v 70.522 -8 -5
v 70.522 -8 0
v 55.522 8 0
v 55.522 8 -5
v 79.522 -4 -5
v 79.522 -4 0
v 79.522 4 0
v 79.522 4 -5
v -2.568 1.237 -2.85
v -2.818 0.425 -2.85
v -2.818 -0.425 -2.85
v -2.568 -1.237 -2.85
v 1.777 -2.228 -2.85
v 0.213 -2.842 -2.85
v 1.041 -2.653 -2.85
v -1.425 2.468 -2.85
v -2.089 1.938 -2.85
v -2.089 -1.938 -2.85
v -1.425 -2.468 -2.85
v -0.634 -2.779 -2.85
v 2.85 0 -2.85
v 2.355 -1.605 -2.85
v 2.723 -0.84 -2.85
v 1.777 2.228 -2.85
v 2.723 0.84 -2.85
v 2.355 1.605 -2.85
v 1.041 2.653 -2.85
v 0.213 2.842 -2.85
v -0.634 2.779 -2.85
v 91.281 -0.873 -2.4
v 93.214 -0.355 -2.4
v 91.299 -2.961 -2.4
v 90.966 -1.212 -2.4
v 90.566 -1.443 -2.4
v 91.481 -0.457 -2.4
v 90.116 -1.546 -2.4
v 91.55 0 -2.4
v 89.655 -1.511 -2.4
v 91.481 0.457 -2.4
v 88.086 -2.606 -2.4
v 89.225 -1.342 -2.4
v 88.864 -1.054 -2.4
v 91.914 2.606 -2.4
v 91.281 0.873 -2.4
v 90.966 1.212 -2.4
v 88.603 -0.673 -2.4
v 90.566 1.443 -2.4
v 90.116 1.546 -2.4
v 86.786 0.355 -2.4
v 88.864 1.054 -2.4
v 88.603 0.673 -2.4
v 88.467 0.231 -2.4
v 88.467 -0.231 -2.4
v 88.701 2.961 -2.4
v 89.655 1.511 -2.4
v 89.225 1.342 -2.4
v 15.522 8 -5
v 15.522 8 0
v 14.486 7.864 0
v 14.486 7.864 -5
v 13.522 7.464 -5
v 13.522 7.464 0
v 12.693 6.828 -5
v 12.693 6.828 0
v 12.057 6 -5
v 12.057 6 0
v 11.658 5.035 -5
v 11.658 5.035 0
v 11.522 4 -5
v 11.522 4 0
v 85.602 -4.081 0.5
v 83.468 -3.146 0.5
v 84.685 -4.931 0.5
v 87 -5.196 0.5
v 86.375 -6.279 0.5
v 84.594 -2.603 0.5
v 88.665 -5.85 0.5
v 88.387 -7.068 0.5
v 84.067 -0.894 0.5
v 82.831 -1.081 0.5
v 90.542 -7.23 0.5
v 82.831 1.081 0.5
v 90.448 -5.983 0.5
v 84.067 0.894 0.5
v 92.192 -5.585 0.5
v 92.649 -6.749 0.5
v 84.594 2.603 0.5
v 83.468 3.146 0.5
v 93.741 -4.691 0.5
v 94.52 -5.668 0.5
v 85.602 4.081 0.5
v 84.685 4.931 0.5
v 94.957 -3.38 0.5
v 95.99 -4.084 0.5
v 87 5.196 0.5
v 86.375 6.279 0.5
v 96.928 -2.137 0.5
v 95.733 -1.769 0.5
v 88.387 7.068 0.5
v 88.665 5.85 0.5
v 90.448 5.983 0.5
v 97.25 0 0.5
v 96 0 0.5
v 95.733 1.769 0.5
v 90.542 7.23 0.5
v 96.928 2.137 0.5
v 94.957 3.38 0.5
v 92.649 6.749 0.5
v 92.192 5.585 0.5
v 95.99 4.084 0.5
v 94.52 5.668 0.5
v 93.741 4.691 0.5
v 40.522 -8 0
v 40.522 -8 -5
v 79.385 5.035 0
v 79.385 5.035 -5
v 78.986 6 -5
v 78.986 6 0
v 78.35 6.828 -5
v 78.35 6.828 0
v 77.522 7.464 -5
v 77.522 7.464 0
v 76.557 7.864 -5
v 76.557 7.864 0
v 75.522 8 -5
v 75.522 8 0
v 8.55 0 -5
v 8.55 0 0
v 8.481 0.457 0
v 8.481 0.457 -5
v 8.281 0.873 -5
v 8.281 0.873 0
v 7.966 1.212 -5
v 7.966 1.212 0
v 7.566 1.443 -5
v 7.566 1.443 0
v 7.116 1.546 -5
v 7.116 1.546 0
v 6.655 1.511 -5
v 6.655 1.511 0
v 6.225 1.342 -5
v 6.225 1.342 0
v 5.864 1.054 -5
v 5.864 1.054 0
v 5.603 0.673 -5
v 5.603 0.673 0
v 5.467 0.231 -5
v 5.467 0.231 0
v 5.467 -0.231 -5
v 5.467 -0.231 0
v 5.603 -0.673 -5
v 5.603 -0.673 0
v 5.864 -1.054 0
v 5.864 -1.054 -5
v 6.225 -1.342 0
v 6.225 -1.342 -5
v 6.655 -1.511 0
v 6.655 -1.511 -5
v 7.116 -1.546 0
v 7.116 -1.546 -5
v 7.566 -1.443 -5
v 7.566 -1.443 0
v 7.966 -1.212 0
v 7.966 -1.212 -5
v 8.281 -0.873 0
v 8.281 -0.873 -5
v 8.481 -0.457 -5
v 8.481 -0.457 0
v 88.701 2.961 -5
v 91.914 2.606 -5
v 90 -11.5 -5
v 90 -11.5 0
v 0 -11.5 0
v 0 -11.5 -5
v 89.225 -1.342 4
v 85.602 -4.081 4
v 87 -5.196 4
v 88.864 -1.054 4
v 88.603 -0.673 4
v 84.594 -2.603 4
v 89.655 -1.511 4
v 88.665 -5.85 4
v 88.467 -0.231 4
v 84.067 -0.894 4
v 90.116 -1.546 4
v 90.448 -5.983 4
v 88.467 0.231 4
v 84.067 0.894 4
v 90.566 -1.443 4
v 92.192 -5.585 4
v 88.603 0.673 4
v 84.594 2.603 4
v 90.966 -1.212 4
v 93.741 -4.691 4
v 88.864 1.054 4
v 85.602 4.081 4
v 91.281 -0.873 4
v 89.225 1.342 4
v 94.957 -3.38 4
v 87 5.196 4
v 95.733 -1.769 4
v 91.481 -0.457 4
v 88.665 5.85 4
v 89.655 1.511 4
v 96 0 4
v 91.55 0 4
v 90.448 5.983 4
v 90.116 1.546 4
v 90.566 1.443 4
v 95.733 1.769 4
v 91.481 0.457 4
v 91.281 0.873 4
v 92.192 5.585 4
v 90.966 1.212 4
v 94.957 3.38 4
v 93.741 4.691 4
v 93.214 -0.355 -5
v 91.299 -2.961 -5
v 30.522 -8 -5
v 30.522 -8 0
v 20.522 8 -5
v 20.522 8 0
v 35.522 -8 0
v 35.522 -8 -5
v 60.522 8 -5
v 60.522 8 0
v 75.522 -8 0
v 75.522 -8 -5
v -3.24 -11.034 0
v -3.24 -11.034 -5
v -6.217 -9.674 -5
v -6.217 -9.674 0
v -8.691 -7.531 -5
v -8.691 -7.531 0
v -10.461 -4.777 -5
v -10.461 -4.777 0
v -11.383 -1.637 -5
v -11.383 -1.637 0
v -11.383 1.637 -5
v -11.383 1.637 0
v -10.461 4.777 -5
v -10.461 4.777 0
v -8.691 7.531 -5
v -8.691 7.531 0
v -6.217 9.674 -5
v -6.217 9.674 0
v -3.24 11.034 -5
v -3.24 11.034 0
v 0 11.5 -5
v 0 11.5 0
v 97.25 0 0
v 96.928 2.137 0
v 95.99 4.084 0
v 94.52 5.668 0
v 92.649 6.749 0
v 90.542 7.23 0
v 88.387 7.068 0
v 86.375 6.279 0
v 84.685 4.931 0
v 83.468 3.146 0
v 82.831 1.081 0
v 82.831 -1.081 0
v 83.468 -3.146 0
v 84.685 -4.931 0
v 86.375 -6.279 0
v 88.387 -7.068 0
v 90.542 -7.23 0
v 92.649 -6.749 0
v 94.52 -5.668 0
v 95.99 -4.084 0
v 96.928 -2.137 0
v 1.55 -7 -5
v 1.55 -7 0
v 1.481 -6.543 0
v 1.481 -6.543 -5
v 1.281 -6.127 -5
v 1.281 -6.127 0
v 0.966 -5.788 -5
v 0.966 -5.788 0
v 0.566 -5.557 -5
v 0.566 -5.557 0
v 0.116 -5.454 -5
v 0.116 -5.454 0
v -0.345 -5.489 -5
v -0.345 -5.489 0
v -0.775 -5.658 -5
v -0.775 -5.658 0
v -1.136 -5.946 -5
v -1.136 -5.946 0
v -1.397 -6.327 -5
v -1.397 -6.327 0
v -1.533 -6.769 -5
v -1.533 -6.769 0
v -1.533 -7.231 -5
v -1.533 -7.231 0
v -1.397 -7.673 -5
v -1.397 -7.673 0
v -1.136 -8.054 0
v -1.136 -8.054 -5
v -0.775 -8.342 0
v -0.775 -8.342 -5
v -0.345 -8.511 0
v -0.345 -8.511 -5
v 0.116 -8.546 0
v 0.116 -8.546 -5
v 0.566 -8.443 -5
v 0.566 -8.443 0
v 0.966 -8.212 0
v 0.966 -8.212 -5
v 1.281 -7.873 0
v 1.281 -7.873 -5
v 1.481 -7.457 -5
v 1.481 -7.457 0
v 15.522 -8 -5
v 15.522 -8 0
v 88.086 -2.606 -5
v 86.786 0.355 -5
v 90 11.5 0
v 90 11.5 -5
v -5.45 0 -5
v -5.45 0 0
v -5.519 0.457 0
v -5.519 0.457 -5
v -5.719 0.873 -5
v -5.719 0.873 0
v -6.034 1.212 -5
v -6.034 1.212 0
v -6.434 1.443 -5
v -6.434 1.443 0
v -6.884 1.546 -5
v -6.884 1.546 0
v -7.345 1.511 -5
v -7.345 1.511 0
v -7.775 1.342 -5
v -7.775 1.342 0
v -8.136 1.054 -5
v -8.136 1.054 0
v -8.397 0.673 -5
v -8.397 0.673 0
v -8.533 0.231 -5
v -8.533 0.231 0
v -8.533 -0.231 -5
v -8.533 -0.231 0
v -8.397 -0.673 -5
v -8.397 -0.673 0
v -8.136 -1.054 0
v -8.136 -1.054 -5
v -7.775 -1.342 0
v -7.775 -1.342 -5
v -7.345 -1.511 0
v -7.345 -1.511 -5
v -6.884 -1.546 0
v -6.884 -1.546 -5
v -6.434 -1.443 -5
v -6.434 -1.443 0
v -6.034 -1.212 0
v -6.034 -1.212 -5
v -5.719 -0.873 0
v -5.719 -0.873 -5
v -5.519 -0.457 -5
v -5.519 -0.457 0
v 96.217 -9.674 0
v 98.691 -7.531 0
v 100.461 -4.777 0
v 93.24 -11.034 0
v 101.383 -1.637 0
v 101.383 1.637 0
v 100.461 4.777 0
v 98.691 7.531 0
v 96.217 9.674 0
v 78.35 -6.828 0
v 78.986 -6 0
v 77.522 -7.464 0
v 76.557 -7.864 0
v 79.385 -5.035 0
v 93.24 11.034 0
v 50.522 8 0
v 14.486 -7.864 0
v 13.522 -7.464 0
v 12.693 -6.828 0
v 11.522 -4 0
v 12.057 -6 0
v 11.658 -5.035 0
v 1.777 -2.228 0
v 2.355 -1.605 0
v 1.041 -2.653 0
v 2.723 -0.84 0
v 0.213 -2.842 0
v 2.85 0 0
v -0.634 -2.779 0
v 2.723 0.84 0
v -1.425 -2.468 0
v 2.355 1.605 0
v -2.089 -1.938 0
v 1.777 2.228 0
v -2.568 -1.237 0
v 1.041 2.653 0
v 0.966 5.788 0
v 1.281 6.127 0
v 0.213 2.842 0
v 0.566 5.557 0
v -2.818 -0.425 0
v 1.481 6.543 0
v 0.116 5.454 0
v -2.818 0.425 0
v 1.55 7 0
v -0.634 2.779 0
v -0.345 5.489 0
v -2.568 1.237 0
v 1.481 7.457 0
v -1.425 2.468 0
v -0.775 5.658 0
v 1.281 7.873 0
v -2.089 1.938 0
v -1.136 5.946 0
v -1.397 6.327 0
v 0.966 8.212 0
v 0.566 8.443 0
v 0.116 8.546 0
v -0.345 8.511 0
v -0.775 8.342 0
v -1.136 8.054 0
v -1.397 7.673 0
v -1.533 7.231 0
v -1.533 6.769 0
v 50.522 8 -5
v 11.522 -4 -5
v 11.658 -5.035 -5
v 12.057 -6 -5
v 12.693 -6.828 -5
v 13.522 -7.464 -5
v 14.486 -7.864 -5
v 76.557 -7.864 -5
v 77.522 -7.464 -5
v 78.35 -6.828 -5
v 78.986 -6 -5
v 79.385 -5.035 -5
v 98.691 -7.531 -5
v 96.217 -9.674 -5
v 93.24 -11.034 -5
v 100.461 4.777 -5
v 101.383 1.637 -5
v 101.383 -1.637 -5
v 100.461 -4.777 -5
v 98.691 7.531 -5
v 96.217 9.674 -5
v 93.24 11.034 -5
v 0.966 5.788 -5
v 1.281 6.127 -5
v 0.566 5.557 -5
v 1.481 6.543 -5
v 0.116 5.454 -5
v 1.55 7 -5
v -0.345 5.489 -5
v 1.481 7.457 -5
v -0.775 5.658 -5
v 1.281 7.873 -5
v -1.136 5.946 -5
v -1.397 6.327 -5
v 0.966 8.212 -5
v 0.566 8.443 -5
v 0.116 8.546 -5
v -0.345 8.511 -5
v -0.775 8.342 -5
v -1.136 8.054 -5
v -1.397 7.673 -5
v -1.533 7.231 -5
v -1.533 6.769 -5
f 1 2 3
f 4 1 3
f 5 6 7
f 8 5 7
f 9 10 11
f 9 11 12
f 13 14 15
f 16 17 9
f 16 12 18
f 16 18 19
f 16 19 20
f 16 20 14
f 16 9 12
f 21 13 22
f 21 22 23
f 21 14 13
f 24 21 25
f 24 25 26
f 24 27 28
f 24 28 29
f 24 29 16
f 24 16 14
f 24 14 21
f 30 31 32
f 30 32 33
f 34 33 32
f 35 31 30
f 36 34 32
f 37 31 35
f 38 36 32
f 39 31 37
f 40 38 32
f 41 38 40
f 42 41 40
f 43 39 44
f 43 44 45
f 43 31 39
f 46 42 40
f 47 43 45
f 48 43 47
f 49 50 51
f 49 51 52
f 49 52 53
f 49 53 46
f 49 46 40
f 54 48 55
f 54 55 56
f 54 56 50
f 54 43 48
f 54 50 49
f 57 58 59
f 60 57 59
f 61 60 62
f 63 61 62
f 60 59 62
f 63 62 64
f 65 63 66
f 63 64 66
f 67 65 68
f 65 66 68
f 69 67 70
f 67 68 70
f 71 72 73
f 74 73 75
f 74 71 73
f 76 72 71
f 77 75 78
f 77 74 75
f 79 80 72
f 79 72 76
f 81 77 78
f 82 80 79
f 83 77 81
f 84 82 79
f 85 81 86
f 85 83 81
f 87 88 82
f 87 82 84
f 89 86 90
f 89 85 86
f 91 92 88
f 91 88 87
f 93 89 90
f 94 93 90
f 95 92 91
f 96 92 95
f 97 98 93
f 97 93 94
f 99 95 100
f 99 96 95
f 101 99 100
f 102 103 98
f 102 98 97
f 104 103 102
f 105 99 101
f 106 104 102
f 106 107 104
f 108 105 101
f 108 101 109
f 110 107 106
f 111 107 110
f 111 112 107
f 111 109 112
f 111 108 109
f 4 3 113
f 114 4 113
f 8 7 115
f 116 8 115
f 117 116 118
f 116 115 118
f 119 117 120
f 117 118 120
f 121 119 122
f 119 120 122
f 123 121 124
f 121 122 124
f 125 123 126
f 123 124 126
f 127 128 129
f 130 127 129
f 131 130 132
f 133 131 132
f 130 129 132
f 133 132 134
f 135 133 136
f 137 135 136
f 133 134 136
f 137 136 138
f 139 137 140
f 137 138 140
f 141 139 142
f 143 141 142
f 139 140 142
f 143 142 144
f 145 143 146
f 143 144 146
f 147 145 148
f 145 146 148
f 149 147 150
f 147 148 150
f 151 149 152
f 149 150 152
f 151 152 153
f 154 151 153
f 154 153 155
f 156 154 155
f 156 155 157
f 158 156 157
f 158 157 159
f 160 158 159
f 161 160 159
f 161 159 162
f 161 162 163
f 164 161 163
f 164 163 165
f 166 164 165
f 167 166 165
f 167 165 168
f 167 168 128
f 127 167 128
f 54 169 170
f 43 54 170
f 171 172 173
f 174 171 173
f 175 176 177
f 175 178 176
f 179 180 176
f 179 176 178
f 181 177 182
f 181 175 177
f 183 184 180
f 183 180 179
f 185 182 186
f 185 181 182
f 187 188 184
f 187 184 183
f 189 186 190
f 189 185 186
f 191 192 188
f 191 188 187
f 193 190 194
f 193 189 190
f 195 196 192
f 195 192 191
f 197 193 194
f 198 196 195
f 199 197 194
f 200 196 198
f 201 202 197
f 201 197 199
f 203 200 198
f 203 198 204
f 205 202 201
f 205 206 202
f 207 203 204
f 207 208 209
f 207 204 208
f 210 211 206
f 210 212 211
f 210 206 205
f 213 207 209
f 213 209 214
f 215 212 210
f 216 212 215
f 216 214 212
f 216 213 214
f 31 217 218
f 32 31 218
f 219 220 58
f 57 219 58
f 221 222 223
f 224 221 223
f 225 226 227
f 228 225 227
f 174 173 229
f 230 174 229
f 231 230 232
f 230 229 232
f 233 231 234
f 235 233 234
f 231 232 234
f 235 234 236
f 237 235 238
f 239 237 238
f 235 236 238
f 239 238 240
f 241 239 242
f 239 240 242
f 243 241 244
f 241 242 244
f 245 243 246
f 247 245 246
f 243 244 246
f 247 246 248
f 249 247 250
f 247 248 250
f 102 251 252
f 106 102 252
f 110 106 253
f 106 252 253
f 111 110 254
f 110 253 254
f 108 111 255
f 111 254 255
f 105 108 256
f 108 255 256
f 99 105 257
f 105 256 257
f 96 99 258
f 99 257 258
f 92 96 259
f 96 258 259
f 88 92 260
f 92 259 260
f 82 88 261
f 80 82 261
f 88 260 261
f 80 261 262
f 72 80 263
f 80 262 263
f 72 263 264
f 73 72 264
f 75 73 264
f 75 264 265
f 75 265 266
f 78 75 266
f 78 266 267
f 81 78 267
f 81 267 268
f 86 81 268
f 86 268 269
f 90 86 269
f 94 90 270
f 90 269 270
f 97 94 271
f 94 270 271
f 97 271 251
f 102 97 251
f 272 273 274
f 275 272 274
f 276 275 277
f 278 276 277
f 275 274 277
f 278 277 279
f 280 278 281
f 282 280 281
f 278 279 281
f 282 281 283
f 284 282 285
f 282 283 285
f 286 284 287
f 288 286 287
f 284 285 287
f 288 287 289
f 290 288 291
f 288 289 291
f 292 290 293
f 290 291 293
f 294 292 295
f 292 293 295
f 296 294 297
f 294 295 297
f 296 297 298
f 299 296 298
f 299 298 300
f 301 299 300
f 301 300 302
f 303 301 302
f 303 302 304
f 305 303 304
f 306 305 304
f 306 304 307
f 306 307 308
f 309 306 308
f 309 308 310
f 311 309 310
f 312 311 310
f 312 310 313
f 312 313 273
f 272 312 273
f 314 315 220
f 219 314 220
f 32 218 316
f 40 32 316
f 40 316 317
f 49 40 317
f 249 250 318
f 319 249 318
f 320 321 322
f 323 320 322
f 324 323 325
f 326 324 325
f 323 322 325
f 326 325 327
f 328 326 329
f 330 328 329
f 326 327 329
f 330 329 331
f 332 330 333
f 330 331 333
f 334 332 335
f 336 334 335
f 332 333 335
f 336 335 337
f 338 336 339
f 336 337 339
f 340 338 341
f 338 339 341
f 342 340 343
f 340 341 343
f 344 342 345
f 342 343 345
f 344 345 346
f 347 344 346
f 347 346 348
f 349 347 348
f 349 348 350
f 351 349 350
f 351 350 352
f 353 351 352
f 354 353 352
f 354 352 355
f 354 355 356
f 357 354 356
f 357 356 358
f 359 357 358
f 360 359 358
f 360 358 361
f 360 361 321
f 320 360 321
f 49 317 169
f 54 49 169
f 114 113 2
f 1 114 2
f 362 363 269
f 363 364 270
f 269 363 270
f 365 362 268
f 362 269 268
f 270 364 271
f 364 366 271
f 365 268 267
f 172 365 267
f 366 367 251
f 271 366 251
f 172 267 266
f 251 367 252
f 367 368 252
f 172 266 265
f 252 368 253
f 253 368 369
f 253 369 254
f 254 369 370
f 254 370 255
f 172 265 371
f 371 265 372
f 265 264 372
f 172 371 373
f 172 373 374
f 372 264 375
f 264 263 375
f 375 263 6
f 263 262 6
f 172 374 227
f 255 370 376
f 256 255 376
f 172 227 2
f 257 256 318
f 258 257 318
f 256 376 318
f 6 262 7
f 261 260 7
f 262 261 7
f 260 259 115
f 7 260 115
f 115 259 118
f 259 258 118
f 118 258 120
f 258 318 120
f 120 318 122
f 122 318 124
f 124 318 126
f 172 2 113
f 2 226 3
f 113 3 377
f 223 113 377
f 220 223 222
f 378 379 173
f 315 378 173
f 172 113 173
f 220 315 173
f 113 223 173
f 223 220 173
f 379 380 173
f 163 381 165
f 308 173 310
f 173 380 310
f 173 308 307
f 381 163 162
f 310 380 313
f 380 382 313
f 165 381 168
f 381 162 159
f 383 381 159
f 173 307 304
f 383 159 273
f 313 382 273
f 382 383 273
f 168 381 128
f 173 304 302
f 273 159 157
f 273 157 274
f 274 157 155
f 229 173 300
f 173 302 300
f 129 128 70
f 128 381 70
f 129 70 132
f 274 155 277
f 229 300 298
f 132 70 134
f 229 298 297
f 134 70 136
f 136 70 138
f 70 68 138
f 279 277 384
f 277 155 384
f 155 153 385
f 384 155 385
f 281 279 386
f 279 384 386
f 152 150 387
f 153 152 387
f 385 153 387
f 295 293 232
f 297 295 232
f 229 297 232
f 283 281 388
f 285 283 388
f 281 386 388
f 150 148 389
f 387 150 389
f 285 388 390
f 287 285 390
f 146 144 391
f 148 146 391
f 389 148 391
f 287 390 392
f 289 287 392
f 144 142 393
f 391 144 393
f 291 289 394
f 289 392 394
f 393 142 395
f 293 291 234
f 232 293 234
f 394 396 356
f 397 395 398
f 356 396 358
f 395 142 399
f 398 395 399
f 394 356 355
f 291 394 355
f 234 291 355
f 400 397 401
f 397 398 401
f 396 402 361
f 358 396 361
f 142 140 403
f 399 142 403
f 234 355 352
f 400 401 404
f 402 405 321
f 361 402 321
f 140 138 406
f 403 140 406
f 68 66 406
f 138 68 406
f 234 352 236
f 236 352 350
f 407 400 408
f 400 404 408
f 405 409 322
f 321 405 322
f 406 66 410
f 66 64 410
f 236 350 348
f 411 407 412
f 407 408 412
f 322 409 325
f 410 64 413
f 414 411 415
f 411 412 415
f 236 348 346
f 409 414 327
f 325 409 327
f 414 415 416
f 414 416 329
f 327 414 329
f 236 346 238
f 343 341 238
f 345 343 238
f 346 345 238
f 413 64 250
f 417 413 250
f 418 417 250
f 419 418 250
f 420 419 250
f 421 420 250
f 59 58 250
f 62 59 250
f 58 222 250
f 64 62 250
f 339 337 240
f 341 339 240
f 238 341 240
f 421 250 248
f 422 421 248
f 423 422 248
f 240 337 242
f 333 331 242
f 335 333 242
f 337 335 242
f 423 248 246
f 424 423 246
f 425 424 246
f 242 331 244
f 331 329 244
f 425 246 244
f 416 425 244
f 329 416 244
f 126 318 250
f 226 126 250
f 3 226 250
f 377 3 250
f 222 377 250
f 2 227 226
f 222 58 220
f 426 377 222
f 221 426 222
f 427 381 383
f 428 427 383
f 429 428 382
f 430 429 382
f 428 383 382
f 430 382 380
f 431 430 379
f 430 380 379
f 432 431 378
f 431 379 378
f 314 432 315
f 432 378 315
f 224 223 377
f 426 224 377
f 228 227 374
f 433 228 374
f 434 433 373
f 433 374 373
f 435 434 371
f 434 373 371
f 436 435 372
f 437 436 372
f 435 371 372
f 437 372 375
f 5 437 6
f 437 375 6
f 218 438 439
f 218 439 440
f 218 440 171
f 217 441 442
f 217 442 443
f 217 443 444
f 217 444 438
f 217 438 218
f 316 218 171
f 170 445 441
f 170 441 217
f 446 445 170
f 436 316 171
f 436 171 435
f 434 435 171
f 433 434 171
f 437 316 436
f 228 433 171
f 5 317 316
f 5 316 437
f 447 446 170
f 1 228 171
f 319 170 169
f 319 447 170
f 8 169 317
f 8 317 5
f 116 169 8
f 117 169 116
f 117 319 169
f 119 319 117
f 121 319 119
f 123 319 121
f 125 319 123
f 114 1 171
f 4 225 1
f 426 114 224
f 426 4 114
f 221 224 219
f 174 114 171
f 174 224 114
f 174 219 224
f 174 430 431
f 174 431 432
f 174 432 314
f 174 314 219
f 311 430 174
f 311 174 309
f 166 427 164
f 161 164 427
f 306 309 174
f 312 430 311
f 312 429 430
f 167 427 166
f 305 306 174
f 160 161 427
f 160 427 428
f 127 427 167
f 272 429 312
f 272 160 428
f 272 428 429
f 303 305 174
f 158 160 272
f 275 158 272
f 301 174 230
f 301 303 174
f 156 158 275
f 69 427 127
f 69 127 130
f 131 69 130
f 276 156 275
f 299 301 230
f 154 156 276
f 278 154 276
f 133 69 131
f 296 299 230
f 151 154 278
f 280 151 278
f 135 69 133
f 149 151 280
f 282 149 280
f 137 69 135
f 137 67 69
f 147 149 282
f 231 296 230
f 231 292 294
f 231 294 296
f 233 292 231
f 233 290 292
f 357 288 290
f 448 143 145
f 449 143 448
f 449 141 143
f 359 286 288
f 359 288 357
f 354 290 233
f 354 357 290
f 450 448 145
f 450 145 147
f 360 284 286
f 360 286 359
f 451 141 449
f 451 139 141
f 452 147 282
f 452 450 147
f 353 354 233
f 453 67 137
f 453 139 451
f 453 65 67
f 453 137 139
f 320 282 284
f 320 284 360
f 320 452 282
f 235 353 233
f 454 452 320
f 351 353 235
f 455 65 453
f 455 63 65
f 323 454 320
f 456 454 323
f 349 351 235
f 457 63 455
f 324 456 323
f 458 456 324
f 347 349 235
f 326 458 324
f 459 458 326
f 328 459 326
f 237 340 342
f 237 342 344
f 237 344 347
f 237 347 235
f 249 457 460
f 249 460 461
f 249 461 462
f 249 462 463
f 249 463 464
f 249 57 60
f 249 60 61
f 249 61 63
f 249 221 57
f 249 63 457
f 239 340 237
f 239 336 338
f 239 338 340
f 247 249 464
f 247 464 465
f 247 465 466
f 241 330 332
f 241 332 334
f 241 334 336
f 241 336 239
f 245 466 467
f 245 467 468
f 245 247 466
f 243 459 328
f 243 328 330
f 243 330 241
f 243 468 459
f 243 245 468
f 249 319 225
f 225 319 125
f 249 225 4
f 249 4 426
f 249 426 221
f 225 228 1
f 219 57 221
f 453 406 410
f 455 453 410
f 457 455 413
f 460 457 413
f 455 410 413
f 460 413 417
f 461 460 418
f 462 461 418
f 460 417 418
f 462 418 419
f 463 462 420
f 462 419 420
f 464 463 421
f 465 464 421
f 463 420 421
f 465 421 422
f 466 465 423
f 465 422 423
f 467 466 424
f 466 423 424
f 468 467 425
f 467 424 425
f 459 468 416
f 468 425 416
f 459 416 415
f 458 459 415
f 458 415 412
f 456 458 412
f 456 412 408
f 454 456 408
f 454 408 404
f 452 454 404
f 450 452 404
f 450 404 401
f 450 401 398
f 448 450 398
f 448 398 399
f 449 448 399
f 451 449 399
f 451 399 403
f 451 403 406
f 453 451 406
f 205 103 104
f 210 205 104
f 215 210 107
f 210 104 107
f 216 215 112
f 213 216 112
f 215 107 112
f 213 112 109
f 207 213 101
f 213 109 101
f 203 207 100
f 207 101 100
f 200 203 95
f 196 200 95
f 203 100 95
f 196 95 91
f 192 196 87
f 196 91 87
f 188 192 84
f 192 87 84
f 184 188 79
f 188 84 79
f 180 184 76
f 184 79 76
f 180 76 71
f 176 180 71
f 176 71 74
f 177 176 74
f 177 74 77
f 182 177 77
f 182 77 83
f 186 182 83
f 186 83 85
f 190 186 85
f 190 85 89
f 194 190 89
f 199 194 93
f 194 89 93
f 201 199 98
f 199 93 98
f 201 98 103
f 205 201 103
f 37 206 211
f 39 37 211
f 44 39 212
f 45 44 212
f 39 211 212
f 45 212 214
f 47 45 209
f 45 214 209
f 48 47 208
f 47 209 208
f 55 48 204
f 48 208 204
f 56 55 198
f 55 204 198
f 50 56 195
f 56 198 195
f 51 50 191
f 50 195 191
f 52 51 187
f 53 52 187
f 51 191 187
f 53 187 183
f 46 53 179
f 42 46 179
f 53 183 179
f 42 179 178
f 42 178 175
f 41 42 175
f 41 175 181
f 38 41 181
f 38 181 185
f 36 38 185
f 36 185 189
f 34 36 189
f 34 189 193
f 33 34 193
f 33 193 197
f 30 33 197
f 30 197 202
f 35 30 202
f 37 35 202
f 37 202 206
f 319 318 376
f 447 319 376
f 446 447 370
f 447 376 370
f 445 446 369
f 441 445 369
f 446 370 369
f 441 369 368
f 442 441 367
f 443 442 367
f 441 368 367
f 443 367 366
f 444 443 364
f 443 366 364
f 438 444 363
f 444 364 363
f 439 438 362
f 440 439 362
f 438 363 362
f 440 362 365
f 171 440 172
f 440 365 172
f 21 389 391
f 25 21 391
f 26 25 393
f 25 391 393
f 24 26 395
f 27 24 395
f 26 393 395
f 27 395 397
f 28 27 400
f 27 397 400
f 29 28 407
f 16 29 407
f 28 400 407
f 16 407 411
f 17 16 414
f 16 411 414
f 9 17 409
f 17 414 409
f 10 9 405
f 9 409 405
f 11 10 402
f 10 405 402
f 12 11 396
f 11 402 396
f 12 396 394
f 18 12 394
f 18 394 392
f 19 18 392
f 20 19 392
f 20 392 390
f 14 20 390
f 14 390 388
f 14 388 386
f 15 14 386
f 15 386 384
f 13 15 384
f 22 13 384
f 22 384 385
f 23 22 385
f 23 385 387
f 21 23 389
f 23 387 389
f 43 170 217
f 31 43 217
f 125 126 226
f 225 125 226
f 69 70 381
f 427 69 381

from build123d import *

# Parameters (mm, degrees)
BOSS_EXTRUDE1_DEPTH = 5
SKETCH11_R          = 7.25
BOSS_EXTRUDE3_DEPTH = 0.5
SKETCH12_R          = 6
BOSS_EXTRUDE4_DEPTH = 3.5
SKETCH13_R          = 1.55
CUT_EXTRUDE1_DEPTH  = 20.5
CUT_EXTRUDE2_DEPTH  = 2.6
SKETCH17_R          = 1.55
CUT_EXTRUDE4_DEPTH  = 10.02
SKETCH18_R          = 2.85
CUT_EXTRUDE5_DEPTH  = 2.85
CUT_EXTRUDE7_DEPTH  = 10


with BuildPart() as part:
    # Sketch2 → Boss-Extrude1 (new body)
    with BuildSketch(Plane.XY):
        with BuildLine():
            Line((0, 11.5), (90, 11.5))
            ThreePointArc((90, 11.5), (101.5, 0), (90, -11.5))
            Line((90, -11.5), (0, -11.5))
            ThreePointArc((0, -11.5), (-11.5, 0), (0, 11.5))
        make_face()
    extrude(amount=-BOSS_EXTRUDE1_DEPTH)

    # Sketch11 → Boss-Extrude3 (add)
    with BuildSketch(Plane.XY):
        with Locations((90, 0)):
            Circle(SKETCH11_R)
    extrude(amount=BOSS_EXTRUDE3_DEPTH)

    # Sketch12 → Boss-Extrude4 (add)
    with BuildSketch(Plane.XY.offset(0.5)):
        with Locations((90, 0)):
            Circle(SKETCH12_R)
    extrude(amount=BOSS_EXTRUDE4_DEPTH)

    # Sketch13 → Cut-Extrude1 (cut)
    with BuildSketch(Plane.XY.offset(4)):
        with Locations((90, 0)):
            Circle(SKETCH13_R)
    extrude(amount=-CUT_EXTRUDE1_DEPTH, mode=Mode.SUBTRACT)

    # Sketch14 → Cut-Extrude2 (cut)
    with BuildSketch(Plane(origin=(0, 0, -5), x_dir=(-1, 0, 0), z_dir=(0, 0, -1))):
        Polygon((-93.213605432, -0.355068252), (-91.299304589, -2.960598068), (-88.085699158, -2.605529815), (-86.786394568, 0.355068252), (-88.700695411, 2.960598068), (-91.914300842, 2.605529815), align=None)
    extrude(amount=-CUT_EXTRUDE2_DEPTH, mode=Mode.SUBTRACT)

    # Sketch17 → Cut-Extrude4 (cut)
    with BuildSketch(Plane.XY):
        with Locations((0, 7)):
            Circle(SKETCH17_R)
        with Locations((0, -7)):
            Circle(SKETCH17_R)
        with Locations((-7, 0)):
            Circle(SKETCH17_R)
        with Locations((7, 0)):
            Circle(SKETCH17_R)
    extrude(amount=-CUT_EXTRUDE4_DEPTH, mode=Mode.SUBTRACT)

    # Sketch18 → Cut-Extrude5 (cut)
    with BuildSketch(Plane.XY):
        Circle(SKETCH18_R)
    extrude(amount=-CUT_EXTRUDE5_DEPTH, mode=Mode.SUBTRACT)

    # Sketch19 → Cut-Extrude7 (cut)
    with BuildSketch(Plane.XY):
        with BuildLine():
            Line((30.521520475, -8), (15.521520475, 8))
            ThreePointArc((15.521520475, 8), (12.69309335, 6.828427125), (11.521520475, 4))
            Line((11.521520475, 4), (11.521520475, -4))
            ThreePointArc((11.521520475, -4), (12.69309335, -6.828427125), (15.521520475, -8))
            Line((15.521520475, -8), (30.521520475, -8))
        make_face()
        Polygon((50.521520475, 8), (20.521520475, 8), (35.521520475, -8), align=None)
        Polygon((70.521520475, -8), (55.521520475, 8), (40.521520475, -8), align=None)
        with BuildLine():
            Line((75.521520475, 8), (60.521520475, 8))
            Line((60.521520475, 8), (75.521520475, -8))
            ThreePointArc((75.521520475, -8), (78.3499476, -6.828427125), (79.521520475, -4))
            Line((79.521520475, -4), (79.521520475, 4))
            ThreePointArc((79.521520475, 4), (78.3499476, 6.828427125), (75.521520475, 8))
        make_face()
    extrude(amount=-CUT_EXTRUDE7_DEPTH, mode=Mode.SUBTRACT)


solid = part.part
